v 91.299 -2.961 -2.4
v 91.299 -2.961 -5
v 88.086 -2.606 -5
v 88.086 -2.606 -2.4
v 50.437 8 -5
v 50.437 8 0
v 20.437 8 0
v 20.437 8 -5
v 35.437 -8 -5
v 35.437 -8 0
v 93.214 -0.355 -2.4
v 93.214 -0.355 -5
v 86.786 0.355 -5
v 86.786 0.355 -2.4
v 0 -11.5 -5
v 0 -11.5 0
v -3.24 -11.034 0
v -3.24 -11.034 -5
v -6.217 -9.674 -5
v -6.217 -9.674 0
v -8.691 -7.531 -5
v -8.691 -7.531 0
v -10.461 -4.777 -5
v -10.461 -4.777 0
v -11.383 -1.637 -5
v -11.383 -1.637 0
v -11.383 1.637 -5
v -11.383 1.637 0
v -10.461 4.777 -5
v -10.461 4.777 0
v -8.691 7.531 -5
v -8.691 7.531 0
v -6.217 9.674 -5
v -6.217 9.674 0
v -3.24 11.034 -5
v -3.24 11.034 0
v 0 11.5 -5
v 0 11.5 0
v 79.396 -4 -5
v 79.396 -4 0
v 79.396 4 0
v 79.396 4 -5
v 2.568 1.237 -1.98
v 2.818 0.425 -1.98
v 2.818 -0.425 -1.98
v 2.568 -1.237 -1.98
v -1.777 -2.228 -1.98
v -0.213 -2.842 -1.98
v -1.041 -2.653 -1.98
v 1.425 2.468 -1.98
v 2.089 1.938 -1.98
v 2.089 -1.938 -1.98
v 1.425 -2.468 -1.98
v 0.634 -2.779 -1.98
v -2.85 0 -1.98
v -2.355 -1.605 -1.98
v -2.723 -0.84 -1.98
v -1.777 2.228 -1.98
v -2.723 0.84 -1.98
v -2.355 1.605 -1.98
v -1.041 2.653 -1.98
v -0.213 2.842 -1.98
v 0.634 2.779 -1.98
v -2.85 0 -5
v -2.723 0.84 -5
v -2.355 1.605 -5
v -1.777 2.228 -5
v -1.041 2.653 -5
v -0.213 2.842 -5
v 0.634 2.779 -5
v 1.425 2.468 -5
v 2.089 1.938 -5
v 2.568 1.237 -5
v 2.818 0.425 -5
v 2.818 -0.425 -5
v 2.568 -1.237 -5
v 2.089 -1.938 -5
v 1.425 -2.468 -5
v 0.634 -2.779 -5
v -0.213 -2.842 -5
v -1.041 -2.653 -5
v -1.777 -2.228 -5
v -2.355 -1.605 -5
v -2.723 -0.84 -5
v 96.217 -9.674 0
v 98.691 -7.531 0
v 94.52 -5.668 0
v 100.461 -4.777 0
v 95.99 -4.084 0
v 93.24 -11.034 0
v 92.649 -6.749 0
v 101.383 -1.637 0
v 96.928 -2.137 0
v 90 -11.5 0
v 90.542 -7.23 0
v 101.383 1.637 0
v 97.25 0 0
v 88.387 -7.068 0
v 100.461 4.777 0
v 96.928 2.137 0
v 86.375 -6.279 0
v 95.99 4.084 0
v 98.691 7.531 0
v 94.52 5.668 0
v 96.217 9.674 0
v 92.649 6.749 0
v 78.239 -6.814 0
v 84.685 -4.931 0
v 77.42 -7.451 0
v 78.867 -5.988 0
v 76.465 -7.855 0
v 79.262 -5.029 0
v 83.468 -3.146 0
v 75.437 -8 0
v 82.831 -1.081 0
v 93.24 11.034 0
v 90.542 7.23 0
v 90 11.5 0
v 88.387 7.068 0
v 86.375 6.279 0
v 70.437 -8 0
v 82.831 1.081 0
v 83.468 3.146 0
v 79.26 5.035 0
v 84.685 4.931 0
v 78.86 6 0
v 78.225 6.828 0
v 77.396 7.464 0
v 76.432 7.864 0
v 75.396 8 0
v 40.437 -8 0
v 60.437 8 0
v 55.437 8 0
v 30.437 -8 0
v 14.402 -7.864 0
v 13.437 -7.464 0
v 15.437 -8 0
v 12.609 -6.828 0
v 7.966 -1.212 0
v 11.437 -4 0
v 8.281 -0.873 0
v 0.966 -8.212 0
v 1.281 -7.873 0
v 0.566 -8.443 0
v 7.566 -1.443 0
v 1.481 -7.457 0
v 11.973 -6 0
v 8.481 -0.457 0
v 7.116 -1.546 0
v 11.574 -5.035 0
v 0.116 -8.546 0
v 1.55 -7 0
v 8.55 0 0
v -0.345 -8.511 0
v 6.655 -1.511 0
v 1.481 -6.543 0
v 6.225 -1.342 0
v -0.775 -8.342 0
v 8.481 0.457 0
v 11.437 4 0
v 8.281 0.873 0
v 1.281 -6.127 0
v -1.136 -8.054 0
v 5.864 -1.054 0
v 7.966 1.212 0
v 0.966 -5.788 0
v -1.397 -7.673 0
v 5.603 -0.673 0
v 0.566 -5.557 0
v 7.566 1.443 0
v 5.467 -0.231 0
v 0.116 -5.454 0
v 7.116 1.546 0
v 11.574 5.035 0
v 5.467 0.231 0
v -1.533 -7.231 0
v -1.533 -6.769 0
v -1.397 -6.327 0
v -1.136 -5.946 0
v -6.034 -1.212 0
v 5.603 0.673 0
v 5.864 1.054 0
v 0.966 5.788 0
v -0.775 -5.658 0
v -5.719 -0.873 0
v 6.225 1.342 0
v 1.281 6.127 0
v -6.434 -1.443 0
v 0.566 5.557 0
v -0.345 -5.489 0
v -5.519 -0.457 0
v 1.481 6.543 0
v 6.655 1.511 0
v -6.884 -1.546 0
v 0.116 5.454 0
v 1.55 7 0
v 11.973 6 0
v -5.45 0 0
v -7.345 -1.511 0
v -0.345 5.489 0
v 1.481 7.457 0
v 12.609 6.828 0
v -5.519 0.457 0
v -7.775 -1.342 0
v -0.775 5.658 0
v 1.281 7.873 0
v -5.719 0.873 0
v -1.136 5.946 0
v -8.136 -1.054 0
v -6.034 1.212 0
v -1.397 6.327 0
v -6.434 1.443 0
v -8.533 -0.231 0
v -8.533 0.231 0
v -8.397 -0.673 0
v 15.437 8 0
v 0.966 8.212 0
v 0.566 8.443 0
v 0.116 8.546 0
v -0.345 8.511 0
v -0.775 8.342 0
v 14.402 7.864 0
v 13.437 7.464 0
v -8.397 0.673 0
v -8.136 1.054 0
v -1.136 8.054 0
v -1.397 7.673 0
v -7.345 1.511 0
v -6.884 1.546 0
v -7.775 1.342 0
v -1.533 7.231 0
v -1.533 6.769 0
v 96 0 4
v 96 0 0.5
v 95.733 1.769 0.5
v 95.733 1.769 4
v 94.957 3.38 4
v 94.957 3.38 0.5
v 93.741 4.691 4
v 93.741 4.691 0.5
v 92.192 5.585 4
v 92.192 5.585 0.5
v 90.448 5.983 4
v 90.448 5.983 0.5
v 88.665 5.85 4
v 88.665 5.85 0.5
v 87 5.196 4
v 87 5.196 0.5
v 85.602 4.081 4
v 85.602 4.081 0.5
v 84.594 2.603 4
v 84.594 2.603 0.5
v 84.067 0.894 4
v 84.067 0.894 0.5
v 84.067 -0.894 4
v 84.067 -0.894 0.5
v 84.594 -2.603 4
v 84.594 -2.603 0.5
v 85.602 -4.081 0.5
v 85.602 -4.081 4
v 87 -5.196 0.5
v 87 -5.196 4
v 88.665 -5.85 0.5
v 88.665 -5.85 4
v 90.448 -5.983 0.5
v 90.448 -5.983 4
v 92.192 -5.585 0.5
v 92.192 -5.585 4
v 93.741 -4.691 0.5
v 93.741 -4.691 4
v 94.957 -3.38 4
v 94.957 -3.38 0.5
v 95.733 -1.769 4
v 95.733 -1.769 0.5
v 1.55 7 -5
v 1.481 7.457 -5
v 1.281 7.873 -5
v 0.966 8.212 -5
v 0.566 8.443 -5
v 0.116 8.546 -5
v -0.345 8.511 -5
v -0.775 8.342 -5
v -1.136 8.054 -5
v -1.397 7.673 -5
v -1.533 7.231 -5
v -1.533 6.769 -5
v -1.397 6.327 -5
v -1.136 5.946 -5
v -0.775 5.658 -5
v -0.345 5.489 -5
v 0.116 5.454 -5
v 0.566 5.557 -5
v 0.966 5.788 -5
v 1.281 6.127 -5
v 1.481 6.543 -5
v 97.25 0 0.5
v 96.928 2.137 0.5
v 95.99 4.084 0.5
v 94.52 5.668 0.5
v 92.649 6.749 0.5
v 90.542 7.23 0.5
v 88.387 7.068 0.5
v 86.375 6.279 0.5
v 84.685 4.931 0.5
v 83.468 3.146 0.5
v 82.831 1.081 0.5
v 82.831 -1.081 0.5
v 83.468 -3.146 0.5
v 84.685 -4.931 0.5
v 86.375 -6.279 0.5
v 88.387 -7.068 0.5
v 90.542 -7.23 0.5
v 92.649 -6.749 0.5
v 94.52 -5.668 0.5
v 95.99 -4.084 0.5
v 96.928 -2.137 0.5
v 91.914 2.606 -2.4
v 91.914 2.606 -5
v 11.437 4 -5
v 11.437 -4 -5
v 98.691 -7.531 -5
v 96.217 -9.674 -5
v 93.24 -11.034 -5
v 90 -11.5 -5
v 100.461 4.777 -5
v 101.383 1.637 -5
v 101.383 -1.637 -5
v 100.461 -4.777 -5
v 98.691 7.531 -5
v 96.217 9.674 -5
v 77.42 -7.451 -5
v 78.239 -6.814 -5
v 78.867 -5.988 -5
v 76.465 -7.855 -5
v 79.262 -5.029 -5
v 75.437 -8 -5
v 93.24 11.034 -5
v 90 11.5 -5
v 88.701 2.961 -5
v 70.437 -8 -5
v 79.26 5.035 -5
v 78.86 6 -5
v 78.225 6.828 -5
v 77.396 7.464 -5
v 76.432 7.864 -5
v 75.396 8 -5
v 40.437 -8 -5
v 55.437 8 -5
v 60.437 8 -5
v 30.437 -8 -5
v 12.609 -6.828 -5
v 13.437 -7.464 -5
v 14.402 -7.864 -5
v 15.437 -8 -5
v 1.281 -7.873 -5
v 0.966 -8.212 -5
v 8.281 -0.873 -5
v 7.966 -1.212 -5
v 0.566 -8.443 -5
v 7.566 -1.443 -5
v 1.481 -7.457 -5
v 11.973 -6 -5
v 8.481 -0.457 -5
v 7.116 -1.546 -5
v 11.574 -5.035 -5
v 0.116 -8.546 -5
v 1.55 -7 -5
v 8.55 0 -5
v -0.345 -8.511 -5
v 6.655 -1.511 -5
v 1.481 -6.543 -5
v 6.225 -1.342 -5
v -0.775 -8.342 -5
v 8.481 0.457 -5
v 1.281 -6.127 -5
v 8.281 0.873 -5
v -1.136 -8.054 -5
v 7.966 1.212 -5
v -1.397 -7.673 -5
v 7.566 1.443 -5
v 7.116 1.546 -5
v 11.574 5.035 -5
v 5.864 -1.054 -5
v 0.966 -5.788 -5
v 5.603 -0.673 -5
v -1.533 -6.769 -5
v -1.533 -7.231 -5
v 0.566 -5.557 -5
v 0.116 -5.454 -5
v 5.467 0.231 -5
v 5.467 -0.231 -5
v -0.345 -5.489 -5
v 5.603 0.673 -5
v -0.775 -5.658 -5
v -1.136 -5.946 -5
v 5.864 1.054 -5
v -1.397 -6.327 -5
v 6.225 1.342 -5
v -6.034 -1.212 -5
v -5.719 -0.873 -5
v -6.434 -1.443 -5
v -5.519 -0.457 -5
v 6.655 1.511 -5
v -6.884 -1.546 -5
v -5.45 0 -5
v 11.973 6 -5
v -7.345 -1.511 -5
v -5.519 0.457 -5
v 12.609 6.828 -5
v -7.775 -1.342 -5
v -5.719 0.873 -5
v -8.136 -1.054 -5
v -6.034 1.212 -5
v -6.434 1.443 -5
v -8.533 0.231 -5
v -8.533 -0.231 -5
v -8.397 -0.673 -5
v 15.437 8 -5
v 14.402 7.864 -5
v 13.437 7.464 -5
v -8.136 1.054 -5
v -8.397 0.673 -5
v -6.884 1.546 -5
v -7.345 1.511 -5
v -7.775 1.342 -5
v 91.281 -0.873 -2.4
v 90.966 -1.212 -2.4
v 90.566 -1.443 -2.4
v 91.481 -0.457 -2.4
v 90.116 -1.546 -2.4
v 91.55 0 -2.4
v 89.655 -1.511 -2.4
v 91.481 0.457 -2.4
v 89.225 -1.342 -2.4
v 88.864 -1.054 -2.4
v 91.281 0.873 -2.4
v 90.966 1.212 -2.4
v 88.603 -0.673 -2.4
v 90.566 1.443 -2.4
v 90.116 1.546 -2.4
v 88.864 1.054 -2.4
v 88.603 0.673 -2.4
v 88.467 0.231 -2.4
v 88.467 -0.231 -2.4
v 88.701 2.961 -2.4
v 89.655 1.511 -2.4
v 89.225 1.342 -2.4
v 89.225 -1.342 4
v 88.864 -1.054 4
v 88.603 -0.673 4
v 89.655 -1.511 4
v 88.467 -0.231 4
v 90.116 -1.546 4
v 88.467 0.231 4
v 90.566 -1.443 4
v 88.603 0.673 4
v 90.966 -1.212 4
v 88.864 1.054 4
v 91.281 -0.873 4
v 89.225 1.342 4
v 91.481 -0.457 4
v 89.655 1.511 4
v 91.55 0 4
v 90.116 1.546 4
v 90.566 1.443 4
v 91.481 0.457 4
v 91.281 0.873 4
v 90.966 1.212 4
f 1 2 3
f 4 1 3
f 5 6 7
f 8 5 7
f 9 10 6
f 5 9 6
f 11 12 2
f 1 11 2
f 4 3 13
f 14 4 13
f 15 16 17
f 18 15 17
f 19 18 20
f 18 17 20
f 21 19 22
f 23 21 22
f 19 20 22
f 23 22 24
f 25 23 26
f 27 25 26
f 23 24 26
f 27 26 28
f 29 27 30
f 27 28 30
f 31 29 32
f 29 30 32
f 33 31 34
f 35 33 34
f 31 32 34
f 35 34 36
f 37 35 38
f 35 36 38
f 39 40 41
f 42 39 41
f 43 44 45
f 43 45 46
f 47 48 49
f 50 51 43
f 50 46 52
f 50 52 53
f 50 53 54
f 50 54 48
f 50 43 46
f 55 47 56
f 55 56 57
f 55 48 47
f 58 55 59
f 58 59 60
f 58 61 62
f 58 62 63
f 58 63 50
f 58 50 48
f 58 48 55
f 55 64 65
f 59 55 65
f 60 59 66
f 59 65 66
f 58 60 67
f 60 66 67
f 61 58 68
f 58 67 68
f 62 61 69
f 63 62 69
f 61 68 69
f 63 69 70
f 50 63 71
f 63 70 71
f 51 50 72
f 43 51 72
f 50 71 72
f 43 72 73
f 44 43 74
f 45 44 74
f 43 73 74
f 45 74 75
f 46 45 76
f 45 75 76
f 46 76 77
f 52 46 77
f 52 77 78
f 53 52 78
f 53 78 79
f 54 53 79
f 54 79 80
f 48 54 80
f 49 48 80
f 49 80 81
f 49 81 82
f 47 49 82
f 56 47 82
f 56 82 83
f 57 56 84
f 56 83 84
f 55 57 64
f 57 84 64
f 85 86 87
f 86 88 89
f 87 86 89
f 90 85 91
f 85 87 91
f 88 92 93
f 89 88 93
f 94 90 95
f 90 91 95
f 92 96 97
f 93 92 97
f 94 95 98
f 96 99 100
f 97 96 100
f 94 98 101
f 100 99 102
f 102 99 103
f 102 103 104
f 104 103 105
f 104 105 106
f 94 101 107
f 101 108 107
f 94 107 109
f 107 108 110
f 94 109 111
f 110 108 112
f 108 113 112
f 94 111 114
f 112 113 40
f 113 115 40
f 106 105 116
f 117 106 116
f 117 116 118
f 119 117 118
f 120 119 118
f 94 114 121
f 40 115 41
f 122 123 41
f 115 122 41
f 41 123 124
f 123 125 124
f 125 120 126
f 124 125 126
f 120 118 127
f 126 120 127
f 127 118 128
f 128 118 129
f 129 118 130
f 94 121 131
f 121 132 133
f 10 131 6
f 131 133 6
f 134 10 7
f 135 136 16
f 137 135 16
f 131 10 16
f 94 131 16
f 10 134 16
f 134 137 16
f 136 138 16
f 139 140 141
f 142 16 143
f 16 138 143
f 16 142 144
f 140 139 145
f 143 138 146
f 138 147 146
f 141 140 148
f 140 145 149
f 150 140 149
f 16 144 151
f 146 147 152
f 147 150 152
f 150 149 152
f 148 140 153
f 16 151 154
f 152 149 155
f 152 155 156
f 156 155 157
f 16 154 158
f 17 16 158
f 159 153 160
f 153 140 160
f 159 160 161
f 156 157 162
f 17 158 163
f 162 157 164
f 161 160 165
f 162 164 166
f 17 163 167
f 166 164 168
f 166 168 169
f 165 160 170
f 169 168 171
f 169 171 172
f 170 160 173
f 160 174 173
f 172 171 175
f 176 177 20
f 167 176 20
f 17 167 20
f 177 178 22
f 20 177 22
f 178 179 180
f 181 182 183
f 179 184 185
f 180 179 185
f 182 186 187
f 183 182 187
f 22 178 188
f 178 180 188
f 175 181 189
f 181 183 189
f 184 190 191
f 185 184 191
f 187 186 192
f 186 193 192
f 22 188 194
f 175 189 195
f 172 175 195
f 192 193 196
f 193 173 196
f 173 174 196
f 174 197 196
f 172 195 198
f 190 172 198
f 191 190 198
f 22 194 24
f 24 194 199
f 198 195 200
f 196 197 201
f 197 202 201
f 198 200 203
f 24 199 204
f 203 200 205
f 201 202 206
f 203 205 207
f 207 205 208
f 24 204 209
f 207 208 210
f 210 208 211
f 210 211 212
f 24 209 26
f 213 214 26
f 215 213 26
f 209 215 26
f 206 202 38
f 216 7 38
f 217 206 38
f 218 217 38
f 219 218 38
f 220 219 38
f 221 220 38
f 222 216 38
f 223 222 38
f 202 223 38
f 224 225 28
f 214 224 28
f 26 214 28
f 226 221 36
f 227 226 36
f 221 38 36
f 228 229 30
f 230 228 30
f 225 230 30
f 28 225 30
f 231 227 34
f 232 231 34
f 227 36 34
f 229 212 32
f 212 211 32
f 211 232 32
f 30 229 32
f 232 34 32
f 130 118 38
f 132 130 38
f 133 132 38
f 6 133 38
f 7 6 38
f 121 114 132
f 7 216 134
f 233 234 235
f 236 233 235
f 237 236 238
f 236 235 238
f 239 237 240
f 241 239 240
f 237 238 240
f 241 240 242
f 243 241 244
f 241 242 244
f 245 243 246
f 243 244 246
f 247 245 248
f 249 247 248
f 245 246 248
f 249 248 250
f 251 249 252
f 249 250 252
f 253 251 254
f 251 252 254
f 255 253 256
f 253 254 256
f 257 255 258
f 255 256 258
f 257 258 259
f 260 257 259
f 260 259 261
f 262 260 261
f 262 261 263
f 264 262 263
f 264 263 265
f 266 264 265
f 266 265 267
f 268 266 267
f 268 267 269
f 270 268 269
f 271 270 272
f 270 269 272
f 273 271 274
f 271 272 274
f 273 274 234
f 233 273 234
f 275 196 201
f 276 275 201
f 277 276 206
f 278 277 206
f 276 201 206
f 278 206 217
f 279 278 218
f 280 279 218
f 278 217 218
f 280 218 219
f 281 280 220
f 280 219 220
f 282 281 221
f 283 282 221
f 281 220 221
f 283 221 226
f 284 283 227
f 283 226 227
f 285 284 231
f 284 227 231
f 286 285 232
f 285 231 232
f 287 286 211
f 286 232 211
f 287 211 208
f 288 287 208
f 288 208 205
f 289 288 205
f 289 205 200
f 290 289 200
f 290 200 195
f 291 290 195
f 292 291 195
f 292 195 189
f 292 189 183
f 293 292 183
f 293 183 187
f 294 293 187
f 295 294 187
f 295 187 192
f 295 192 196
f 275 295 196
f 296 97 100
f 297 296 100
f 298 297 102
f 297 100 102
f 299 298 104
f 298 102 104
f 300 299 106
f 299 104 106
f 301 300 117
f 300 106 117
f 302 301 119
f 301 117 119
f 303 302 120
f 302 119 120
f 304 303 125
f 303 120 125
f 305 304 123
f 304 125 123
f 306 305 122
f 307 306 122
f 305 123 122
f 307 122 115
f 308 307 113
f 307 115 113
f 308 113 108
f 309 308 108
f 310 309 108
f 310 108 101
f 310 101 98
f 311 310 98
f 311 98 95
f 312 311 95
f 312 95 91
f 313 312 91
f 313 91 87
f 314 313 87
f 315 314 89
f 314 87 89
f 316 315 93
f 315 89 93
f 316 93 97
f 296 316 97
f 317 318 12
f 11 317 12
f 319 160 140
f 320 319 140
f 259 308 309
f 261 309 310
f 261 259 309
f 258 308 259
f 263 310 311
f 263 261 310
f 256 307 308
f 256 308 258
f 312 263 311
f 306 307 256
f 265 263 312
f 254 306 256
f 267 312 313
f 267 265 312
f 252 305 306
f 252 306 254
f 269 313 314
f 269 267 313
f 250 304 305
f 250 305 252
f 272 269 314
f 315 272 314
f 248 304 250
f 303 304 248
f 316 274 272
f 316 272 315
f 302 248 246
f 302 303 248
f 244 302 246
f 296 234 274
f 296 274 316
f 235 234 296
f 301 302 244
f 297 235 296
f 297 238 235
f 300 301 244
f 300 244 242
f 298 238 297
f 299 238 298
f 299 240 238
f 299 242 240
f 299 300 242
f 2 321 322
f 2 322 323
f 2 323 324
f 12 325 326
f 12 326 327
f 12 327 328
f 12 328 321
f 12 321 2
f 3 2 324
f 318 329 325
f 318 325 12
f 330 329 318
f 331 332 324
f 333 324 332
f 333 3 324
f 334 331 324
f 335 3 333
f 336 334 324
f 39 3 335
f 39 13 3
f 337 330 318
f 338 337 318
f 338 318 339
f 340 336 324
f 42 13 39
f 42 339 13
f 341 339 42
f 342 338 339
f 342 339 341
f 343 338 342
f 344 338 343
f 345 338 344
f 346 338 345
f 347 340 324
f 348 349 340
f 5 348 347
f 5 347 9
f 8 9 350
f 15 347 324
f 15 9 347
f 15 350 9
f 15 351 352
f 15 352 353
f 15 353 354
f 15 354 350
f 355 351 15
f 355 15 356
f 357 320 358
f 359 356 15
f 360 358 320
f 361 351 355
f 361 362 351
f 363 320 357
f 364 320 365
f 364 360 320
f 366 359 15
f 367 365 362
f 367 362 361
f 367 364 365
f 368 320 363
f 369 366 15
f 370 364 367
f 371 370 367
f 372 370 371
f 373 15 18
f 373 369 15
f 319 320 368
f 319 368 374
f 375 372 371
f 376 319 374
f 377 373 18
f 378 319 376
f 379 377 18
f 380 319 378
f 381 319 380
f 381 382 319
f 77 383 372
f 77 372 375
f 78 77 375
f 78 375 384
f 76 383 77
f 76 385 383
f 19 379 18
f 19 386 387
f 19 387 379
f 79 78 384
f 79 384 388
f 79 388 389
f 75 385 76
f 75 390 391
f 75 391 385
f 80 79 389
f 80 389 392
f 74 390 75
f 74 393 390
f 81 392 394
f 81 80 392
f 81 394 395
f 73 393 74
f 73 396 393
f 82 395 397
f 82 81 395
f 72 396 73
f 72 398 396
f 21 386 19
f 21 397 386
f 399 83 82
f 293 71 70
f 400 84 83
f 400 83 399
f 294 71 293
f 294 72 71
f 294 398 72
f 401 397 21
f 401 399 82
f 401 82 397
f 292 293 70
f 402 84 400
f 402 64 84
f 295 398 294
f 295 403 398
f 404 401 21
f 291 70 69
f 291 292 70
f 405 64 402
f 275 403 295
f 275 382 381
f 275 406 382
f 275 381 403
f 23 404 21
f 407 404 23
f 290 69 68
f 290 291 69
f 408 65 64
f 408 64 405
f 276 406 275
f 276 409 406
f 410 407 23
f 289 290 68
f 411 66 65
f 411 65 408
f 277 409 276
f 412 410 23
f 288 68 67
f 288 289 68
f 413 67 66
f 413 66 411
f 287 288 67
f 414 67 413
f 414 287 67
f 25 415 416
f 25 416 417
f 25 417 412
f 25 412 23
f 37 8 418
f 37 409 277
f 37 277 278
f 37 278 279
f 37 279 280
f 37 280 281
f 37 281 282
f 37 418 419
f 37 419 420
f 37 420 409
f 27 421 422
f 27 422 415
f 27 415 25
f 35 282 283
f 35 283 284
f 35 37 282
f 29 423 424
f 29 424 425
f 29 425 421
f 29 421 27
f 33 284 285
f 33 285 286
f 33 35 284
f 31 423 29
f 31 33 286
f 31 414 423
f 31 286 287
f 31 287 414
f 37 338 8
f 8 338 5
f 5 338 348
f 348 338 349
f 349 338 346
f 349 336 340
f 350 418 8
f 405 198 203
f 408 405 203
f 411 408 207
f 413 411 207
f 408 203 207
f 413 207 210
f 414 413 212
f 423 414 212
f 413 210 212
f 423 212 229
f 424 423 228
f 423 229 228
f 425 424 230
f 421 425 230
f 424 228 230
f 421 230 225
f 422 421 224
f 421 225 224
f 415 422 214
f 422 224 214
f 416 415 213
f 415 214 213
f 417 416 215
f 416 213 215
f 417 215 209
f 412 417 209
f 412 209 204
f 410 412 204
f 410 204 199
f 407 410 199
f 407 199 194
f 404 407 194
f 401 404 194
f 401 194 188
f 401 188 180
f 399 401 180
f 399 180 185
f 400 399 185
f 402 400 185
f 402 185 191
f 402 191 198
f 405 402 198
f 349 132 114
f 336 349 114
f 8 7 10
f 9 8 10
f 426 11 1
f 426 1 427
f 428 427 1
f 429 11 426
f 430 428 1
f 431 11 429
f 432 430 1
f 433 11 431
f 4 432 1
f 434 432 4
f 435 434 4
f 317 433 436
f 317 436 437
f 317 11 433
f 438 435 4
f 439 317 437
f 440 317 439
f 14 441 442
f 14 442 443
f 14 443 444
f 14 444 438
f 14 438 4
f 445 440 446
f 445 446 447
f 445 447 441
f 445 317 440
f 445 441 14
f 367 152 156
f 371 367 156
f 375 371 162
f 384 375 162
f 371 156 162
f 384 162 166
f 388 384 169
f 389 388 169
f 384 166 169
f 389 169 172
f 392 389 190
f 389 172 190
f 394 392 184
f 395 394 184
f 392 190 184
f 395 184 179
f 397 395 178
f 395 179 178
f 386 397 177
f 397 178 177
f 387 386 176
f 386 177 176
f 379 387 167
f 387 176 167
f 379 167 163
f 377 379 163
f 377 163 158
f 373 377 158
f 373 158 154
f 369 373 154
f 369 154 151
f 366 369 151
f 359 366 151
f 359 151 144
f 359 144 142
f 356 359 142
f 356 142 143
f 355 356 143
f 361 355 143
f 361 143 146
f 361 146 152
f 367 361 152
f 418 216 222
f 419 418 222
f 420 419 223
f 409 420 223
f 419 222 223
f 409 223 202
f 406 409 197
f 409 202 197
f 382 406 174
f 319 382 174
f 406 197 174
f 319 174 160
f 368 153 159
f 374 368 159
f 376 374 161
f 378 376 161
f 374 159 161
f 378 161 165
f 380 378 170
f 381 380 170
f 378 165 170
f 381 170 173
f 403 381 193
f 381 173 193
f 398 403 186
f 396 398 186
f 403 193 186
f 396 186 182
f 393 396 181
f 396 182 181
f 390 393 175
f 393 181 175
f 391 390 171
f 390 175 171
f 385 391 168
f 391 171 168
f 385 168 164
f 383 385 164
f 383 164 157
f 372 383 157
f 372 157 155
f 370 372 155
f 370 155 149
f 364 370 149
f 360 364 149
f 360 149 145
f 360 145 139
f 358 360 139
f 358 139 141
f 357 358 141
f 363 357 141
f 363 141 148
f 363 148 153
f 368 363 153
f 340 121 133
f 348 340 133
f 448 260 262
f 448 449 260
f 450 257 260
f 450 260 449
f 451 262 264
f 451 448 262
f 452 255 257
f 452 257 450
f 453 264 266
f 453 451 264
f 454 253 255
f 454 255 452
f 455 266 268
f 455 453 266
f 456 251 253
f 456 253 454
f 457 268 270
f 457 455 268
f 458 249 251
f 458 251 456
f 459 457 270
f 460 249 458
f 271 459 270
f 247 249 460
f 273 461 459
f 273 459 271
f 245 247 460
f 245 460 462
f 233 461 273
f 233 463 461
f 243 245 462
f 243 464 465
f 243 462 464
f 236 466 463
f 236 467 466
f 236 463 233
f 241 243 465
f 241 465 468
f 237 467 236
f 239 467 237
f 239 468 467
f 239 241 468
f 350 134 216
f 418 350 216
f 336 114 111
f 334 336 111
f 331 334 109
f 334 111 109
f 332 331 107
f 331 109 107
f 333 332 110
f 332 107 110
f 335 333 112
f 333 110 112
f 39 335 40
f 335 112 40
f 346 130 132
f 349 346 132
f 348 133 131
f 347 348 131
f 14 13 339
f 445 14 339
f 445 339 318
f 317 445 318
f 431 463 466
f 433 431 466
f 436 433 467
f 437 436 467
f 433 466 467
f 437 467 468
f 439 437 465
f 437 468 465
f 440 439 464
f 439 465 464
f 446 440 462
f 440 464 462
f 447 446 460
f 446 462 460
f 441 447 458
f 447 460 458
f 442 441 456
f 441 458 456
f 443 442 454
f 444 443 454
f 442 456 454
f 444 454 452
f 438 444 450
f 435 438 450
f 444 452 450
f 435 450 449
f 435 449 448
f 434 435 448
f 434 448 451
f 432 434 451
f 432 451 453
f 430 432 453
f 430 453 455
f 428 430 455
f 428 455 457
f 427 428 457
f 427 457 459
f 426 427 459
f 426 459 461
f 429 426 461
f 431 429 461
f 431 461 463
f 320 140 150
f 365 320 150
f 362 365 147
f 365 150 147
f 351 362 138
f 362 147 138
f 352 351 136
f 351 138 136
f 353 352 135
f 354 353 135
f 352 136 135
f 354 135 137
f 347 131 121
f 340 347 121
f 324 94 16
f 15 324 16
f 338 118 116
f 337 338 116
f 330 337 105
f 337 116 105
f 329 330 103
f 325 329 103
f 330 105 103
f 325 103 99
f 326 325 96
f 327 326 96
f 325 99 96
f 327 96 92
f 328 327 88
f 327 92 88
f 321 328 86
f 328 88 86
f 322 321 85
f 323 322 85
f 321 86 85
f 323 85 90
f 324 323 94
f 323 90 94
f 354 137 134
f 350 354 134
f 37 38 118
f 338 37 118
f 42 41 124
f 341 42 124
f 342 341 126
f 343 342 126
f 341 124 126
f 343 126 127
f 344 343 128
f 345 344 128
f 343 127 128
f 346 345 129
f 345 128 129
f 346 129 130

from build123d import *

# Parameters (mm, degrees)
BOSS_EXTRUDE1_DEPTH = 5
SKETCH11_R          = 7.25
BOSS_EXTRUDE3_DEPTH = 0.5
SKETCH12_R          = 6
BOSS_EXTRUDE4_DEPTH = 3.5
SKETCH13_R          = 1.55
CUT_EXTRUDE1_DEPTH  = 20.5
CUT_EXTRUDE2_DEPTH  = 2.6
SKETCH16_R          = 2.85
CUT_EXTRUDE3_DEPTH  = 3.02
SKETCH17_R          = 1.55
CUT_EXTRUDE4_DEPTH  = 10.02
CUT_EXTRUDE13_DEPTH = 10


with BuildPart() as part:
    # Sketch2 → Boss-Extrude1 (new body)
    with BuildSketch(Plane.XY):
        with BuildLine():
            Line((0, 11.5), (90, 11.5))
            ThreePointArc((90, 11.5), (101.5, 0), (90, -11.5))
            Line((90, -11.5), (0, -11.5))
            ThreePointArc((0, -11.5), (-11.5, 0), (0, 11.5))
        make_face()
    extrude(amount=-BOSS_EXTRUDE1_DEPTH)

    # Sketch11 → Boss-Extrude3 (add)
    with BuildSketch(Plane.XY):
        with Locations((90, 0)):
            Circle(SKETCH11_R)
    extrude(amount=BOSS_EXTRUDE3_DEPTH)

    # Sketch12 → Boss-Extrude4 (add)
    with BuildSketch(Plane.XY.offset(0.5)):
        with Locations((90, 0)):
            Circle(SKETCH12_R)
    extrude(amount=BOSS_EXTRUDE4_DEPTH)

    # Sketch13 → Cut-Extrude1 (cut)
    with BuildSketch(Plane.XY.offset(4)):
        with Locations((90, 0)):
            Circle(SKETCH13_R)
    extrude(amount=-CUT_EXTRUDE1_DEPTH, mode=Mode.SUBTRACT)

    # Sketch14 → Cut-Extrude2 (cut)
    with BuildSketch(Plane(origin=(0, 0, -5), x_dir=(-1, 0, 0), z_dir=(0, 0, -1))):
        Polygon((-93.213605432, -0.355068252), (-91.299304589, -2.960598068), (-88.085699158, -2.605529815), (-86.786394568, 0.355068252), (-88.700695411, 2.960598068), (-91.914300842, 2.605529815), align=None)
    extrude(amount=-CUT_EXTRUDE2_DEPTH, mode=Mode.SUBTRACT)

    # Sketch16 → Cut-Extrude3 (cut)
    with BuildSketch(Plane(origin=(0, 0, -5), x_dir=(-1, 0, 0), z_dir=(0, 0, -1))):
        Circle(SKETCH16_R)
    extrude(amount=-CUT_EXTRUDE3_DEPTH, mode=Mode.SUBTRACT)

    # Sketch17 → Cut-Extrude4 (cut)
    with BuildSketch(Plane.XY):
        with Locations((0, 7)):
            Circle(SKETCH17_R)
        with Locations((0, -7)):
            Circle(SKETCH17_R)
        with Locations((-7, 0)):
            Circle(SKETCH17_R)
        with Locations((7, 0)):
            Circle(SKETCH17_R)
    extrude(amount=-CUT_EXTRUDE4_DEPTH, mode=Mode.SUBTRACT)

    # Sketch18 → Cut-Extrude13 (cut)
    with BuildSketch(Plane.XY):
        Polygon((50.43728363, 8), (20.43728363, 8), (35.43728363, -8), align=None)
        with BuildLine():
            Line((30.43728363, -8), (15.43728363, 8))
            ThreePointArc((15.43728363, 8), (12.608856505, 6.828427125), (11.43728363, 4))
            Line((11.43728363, 4), (11.43728363, -4))
            ThreePointArc((11.43728363, -4), (12.608856505, -6.828427125), (15.43728363, -8))
            Line((15.43728363, -8), (30.43728363, -8))
        make_face()
        Polygon((70.43728363, -8), (55.43728363, 8), (40.43728363, -8), align=None)
        with BuildLine():
            Line((75.396348206, 8), (60.43728363, 8))
            Line((60.43728363, 8), (75.43728363, -8))
            ThreePointArc((75.43728363, -8), (78.239211349, -6.814126517), (79.396348206, -4.000209469))
            Line((79.396348206, -4.000209469), (79.396348206, 4))
            ThreePointArc((79.396348206, 4), (78.224775331, 6.828427125), (75.396348206, 8))
        make_face()
    extrude(amount=-CUT_EXTRUDE13_DEPTH, mode=Mode.SUBTRACT)


solid = part.part
